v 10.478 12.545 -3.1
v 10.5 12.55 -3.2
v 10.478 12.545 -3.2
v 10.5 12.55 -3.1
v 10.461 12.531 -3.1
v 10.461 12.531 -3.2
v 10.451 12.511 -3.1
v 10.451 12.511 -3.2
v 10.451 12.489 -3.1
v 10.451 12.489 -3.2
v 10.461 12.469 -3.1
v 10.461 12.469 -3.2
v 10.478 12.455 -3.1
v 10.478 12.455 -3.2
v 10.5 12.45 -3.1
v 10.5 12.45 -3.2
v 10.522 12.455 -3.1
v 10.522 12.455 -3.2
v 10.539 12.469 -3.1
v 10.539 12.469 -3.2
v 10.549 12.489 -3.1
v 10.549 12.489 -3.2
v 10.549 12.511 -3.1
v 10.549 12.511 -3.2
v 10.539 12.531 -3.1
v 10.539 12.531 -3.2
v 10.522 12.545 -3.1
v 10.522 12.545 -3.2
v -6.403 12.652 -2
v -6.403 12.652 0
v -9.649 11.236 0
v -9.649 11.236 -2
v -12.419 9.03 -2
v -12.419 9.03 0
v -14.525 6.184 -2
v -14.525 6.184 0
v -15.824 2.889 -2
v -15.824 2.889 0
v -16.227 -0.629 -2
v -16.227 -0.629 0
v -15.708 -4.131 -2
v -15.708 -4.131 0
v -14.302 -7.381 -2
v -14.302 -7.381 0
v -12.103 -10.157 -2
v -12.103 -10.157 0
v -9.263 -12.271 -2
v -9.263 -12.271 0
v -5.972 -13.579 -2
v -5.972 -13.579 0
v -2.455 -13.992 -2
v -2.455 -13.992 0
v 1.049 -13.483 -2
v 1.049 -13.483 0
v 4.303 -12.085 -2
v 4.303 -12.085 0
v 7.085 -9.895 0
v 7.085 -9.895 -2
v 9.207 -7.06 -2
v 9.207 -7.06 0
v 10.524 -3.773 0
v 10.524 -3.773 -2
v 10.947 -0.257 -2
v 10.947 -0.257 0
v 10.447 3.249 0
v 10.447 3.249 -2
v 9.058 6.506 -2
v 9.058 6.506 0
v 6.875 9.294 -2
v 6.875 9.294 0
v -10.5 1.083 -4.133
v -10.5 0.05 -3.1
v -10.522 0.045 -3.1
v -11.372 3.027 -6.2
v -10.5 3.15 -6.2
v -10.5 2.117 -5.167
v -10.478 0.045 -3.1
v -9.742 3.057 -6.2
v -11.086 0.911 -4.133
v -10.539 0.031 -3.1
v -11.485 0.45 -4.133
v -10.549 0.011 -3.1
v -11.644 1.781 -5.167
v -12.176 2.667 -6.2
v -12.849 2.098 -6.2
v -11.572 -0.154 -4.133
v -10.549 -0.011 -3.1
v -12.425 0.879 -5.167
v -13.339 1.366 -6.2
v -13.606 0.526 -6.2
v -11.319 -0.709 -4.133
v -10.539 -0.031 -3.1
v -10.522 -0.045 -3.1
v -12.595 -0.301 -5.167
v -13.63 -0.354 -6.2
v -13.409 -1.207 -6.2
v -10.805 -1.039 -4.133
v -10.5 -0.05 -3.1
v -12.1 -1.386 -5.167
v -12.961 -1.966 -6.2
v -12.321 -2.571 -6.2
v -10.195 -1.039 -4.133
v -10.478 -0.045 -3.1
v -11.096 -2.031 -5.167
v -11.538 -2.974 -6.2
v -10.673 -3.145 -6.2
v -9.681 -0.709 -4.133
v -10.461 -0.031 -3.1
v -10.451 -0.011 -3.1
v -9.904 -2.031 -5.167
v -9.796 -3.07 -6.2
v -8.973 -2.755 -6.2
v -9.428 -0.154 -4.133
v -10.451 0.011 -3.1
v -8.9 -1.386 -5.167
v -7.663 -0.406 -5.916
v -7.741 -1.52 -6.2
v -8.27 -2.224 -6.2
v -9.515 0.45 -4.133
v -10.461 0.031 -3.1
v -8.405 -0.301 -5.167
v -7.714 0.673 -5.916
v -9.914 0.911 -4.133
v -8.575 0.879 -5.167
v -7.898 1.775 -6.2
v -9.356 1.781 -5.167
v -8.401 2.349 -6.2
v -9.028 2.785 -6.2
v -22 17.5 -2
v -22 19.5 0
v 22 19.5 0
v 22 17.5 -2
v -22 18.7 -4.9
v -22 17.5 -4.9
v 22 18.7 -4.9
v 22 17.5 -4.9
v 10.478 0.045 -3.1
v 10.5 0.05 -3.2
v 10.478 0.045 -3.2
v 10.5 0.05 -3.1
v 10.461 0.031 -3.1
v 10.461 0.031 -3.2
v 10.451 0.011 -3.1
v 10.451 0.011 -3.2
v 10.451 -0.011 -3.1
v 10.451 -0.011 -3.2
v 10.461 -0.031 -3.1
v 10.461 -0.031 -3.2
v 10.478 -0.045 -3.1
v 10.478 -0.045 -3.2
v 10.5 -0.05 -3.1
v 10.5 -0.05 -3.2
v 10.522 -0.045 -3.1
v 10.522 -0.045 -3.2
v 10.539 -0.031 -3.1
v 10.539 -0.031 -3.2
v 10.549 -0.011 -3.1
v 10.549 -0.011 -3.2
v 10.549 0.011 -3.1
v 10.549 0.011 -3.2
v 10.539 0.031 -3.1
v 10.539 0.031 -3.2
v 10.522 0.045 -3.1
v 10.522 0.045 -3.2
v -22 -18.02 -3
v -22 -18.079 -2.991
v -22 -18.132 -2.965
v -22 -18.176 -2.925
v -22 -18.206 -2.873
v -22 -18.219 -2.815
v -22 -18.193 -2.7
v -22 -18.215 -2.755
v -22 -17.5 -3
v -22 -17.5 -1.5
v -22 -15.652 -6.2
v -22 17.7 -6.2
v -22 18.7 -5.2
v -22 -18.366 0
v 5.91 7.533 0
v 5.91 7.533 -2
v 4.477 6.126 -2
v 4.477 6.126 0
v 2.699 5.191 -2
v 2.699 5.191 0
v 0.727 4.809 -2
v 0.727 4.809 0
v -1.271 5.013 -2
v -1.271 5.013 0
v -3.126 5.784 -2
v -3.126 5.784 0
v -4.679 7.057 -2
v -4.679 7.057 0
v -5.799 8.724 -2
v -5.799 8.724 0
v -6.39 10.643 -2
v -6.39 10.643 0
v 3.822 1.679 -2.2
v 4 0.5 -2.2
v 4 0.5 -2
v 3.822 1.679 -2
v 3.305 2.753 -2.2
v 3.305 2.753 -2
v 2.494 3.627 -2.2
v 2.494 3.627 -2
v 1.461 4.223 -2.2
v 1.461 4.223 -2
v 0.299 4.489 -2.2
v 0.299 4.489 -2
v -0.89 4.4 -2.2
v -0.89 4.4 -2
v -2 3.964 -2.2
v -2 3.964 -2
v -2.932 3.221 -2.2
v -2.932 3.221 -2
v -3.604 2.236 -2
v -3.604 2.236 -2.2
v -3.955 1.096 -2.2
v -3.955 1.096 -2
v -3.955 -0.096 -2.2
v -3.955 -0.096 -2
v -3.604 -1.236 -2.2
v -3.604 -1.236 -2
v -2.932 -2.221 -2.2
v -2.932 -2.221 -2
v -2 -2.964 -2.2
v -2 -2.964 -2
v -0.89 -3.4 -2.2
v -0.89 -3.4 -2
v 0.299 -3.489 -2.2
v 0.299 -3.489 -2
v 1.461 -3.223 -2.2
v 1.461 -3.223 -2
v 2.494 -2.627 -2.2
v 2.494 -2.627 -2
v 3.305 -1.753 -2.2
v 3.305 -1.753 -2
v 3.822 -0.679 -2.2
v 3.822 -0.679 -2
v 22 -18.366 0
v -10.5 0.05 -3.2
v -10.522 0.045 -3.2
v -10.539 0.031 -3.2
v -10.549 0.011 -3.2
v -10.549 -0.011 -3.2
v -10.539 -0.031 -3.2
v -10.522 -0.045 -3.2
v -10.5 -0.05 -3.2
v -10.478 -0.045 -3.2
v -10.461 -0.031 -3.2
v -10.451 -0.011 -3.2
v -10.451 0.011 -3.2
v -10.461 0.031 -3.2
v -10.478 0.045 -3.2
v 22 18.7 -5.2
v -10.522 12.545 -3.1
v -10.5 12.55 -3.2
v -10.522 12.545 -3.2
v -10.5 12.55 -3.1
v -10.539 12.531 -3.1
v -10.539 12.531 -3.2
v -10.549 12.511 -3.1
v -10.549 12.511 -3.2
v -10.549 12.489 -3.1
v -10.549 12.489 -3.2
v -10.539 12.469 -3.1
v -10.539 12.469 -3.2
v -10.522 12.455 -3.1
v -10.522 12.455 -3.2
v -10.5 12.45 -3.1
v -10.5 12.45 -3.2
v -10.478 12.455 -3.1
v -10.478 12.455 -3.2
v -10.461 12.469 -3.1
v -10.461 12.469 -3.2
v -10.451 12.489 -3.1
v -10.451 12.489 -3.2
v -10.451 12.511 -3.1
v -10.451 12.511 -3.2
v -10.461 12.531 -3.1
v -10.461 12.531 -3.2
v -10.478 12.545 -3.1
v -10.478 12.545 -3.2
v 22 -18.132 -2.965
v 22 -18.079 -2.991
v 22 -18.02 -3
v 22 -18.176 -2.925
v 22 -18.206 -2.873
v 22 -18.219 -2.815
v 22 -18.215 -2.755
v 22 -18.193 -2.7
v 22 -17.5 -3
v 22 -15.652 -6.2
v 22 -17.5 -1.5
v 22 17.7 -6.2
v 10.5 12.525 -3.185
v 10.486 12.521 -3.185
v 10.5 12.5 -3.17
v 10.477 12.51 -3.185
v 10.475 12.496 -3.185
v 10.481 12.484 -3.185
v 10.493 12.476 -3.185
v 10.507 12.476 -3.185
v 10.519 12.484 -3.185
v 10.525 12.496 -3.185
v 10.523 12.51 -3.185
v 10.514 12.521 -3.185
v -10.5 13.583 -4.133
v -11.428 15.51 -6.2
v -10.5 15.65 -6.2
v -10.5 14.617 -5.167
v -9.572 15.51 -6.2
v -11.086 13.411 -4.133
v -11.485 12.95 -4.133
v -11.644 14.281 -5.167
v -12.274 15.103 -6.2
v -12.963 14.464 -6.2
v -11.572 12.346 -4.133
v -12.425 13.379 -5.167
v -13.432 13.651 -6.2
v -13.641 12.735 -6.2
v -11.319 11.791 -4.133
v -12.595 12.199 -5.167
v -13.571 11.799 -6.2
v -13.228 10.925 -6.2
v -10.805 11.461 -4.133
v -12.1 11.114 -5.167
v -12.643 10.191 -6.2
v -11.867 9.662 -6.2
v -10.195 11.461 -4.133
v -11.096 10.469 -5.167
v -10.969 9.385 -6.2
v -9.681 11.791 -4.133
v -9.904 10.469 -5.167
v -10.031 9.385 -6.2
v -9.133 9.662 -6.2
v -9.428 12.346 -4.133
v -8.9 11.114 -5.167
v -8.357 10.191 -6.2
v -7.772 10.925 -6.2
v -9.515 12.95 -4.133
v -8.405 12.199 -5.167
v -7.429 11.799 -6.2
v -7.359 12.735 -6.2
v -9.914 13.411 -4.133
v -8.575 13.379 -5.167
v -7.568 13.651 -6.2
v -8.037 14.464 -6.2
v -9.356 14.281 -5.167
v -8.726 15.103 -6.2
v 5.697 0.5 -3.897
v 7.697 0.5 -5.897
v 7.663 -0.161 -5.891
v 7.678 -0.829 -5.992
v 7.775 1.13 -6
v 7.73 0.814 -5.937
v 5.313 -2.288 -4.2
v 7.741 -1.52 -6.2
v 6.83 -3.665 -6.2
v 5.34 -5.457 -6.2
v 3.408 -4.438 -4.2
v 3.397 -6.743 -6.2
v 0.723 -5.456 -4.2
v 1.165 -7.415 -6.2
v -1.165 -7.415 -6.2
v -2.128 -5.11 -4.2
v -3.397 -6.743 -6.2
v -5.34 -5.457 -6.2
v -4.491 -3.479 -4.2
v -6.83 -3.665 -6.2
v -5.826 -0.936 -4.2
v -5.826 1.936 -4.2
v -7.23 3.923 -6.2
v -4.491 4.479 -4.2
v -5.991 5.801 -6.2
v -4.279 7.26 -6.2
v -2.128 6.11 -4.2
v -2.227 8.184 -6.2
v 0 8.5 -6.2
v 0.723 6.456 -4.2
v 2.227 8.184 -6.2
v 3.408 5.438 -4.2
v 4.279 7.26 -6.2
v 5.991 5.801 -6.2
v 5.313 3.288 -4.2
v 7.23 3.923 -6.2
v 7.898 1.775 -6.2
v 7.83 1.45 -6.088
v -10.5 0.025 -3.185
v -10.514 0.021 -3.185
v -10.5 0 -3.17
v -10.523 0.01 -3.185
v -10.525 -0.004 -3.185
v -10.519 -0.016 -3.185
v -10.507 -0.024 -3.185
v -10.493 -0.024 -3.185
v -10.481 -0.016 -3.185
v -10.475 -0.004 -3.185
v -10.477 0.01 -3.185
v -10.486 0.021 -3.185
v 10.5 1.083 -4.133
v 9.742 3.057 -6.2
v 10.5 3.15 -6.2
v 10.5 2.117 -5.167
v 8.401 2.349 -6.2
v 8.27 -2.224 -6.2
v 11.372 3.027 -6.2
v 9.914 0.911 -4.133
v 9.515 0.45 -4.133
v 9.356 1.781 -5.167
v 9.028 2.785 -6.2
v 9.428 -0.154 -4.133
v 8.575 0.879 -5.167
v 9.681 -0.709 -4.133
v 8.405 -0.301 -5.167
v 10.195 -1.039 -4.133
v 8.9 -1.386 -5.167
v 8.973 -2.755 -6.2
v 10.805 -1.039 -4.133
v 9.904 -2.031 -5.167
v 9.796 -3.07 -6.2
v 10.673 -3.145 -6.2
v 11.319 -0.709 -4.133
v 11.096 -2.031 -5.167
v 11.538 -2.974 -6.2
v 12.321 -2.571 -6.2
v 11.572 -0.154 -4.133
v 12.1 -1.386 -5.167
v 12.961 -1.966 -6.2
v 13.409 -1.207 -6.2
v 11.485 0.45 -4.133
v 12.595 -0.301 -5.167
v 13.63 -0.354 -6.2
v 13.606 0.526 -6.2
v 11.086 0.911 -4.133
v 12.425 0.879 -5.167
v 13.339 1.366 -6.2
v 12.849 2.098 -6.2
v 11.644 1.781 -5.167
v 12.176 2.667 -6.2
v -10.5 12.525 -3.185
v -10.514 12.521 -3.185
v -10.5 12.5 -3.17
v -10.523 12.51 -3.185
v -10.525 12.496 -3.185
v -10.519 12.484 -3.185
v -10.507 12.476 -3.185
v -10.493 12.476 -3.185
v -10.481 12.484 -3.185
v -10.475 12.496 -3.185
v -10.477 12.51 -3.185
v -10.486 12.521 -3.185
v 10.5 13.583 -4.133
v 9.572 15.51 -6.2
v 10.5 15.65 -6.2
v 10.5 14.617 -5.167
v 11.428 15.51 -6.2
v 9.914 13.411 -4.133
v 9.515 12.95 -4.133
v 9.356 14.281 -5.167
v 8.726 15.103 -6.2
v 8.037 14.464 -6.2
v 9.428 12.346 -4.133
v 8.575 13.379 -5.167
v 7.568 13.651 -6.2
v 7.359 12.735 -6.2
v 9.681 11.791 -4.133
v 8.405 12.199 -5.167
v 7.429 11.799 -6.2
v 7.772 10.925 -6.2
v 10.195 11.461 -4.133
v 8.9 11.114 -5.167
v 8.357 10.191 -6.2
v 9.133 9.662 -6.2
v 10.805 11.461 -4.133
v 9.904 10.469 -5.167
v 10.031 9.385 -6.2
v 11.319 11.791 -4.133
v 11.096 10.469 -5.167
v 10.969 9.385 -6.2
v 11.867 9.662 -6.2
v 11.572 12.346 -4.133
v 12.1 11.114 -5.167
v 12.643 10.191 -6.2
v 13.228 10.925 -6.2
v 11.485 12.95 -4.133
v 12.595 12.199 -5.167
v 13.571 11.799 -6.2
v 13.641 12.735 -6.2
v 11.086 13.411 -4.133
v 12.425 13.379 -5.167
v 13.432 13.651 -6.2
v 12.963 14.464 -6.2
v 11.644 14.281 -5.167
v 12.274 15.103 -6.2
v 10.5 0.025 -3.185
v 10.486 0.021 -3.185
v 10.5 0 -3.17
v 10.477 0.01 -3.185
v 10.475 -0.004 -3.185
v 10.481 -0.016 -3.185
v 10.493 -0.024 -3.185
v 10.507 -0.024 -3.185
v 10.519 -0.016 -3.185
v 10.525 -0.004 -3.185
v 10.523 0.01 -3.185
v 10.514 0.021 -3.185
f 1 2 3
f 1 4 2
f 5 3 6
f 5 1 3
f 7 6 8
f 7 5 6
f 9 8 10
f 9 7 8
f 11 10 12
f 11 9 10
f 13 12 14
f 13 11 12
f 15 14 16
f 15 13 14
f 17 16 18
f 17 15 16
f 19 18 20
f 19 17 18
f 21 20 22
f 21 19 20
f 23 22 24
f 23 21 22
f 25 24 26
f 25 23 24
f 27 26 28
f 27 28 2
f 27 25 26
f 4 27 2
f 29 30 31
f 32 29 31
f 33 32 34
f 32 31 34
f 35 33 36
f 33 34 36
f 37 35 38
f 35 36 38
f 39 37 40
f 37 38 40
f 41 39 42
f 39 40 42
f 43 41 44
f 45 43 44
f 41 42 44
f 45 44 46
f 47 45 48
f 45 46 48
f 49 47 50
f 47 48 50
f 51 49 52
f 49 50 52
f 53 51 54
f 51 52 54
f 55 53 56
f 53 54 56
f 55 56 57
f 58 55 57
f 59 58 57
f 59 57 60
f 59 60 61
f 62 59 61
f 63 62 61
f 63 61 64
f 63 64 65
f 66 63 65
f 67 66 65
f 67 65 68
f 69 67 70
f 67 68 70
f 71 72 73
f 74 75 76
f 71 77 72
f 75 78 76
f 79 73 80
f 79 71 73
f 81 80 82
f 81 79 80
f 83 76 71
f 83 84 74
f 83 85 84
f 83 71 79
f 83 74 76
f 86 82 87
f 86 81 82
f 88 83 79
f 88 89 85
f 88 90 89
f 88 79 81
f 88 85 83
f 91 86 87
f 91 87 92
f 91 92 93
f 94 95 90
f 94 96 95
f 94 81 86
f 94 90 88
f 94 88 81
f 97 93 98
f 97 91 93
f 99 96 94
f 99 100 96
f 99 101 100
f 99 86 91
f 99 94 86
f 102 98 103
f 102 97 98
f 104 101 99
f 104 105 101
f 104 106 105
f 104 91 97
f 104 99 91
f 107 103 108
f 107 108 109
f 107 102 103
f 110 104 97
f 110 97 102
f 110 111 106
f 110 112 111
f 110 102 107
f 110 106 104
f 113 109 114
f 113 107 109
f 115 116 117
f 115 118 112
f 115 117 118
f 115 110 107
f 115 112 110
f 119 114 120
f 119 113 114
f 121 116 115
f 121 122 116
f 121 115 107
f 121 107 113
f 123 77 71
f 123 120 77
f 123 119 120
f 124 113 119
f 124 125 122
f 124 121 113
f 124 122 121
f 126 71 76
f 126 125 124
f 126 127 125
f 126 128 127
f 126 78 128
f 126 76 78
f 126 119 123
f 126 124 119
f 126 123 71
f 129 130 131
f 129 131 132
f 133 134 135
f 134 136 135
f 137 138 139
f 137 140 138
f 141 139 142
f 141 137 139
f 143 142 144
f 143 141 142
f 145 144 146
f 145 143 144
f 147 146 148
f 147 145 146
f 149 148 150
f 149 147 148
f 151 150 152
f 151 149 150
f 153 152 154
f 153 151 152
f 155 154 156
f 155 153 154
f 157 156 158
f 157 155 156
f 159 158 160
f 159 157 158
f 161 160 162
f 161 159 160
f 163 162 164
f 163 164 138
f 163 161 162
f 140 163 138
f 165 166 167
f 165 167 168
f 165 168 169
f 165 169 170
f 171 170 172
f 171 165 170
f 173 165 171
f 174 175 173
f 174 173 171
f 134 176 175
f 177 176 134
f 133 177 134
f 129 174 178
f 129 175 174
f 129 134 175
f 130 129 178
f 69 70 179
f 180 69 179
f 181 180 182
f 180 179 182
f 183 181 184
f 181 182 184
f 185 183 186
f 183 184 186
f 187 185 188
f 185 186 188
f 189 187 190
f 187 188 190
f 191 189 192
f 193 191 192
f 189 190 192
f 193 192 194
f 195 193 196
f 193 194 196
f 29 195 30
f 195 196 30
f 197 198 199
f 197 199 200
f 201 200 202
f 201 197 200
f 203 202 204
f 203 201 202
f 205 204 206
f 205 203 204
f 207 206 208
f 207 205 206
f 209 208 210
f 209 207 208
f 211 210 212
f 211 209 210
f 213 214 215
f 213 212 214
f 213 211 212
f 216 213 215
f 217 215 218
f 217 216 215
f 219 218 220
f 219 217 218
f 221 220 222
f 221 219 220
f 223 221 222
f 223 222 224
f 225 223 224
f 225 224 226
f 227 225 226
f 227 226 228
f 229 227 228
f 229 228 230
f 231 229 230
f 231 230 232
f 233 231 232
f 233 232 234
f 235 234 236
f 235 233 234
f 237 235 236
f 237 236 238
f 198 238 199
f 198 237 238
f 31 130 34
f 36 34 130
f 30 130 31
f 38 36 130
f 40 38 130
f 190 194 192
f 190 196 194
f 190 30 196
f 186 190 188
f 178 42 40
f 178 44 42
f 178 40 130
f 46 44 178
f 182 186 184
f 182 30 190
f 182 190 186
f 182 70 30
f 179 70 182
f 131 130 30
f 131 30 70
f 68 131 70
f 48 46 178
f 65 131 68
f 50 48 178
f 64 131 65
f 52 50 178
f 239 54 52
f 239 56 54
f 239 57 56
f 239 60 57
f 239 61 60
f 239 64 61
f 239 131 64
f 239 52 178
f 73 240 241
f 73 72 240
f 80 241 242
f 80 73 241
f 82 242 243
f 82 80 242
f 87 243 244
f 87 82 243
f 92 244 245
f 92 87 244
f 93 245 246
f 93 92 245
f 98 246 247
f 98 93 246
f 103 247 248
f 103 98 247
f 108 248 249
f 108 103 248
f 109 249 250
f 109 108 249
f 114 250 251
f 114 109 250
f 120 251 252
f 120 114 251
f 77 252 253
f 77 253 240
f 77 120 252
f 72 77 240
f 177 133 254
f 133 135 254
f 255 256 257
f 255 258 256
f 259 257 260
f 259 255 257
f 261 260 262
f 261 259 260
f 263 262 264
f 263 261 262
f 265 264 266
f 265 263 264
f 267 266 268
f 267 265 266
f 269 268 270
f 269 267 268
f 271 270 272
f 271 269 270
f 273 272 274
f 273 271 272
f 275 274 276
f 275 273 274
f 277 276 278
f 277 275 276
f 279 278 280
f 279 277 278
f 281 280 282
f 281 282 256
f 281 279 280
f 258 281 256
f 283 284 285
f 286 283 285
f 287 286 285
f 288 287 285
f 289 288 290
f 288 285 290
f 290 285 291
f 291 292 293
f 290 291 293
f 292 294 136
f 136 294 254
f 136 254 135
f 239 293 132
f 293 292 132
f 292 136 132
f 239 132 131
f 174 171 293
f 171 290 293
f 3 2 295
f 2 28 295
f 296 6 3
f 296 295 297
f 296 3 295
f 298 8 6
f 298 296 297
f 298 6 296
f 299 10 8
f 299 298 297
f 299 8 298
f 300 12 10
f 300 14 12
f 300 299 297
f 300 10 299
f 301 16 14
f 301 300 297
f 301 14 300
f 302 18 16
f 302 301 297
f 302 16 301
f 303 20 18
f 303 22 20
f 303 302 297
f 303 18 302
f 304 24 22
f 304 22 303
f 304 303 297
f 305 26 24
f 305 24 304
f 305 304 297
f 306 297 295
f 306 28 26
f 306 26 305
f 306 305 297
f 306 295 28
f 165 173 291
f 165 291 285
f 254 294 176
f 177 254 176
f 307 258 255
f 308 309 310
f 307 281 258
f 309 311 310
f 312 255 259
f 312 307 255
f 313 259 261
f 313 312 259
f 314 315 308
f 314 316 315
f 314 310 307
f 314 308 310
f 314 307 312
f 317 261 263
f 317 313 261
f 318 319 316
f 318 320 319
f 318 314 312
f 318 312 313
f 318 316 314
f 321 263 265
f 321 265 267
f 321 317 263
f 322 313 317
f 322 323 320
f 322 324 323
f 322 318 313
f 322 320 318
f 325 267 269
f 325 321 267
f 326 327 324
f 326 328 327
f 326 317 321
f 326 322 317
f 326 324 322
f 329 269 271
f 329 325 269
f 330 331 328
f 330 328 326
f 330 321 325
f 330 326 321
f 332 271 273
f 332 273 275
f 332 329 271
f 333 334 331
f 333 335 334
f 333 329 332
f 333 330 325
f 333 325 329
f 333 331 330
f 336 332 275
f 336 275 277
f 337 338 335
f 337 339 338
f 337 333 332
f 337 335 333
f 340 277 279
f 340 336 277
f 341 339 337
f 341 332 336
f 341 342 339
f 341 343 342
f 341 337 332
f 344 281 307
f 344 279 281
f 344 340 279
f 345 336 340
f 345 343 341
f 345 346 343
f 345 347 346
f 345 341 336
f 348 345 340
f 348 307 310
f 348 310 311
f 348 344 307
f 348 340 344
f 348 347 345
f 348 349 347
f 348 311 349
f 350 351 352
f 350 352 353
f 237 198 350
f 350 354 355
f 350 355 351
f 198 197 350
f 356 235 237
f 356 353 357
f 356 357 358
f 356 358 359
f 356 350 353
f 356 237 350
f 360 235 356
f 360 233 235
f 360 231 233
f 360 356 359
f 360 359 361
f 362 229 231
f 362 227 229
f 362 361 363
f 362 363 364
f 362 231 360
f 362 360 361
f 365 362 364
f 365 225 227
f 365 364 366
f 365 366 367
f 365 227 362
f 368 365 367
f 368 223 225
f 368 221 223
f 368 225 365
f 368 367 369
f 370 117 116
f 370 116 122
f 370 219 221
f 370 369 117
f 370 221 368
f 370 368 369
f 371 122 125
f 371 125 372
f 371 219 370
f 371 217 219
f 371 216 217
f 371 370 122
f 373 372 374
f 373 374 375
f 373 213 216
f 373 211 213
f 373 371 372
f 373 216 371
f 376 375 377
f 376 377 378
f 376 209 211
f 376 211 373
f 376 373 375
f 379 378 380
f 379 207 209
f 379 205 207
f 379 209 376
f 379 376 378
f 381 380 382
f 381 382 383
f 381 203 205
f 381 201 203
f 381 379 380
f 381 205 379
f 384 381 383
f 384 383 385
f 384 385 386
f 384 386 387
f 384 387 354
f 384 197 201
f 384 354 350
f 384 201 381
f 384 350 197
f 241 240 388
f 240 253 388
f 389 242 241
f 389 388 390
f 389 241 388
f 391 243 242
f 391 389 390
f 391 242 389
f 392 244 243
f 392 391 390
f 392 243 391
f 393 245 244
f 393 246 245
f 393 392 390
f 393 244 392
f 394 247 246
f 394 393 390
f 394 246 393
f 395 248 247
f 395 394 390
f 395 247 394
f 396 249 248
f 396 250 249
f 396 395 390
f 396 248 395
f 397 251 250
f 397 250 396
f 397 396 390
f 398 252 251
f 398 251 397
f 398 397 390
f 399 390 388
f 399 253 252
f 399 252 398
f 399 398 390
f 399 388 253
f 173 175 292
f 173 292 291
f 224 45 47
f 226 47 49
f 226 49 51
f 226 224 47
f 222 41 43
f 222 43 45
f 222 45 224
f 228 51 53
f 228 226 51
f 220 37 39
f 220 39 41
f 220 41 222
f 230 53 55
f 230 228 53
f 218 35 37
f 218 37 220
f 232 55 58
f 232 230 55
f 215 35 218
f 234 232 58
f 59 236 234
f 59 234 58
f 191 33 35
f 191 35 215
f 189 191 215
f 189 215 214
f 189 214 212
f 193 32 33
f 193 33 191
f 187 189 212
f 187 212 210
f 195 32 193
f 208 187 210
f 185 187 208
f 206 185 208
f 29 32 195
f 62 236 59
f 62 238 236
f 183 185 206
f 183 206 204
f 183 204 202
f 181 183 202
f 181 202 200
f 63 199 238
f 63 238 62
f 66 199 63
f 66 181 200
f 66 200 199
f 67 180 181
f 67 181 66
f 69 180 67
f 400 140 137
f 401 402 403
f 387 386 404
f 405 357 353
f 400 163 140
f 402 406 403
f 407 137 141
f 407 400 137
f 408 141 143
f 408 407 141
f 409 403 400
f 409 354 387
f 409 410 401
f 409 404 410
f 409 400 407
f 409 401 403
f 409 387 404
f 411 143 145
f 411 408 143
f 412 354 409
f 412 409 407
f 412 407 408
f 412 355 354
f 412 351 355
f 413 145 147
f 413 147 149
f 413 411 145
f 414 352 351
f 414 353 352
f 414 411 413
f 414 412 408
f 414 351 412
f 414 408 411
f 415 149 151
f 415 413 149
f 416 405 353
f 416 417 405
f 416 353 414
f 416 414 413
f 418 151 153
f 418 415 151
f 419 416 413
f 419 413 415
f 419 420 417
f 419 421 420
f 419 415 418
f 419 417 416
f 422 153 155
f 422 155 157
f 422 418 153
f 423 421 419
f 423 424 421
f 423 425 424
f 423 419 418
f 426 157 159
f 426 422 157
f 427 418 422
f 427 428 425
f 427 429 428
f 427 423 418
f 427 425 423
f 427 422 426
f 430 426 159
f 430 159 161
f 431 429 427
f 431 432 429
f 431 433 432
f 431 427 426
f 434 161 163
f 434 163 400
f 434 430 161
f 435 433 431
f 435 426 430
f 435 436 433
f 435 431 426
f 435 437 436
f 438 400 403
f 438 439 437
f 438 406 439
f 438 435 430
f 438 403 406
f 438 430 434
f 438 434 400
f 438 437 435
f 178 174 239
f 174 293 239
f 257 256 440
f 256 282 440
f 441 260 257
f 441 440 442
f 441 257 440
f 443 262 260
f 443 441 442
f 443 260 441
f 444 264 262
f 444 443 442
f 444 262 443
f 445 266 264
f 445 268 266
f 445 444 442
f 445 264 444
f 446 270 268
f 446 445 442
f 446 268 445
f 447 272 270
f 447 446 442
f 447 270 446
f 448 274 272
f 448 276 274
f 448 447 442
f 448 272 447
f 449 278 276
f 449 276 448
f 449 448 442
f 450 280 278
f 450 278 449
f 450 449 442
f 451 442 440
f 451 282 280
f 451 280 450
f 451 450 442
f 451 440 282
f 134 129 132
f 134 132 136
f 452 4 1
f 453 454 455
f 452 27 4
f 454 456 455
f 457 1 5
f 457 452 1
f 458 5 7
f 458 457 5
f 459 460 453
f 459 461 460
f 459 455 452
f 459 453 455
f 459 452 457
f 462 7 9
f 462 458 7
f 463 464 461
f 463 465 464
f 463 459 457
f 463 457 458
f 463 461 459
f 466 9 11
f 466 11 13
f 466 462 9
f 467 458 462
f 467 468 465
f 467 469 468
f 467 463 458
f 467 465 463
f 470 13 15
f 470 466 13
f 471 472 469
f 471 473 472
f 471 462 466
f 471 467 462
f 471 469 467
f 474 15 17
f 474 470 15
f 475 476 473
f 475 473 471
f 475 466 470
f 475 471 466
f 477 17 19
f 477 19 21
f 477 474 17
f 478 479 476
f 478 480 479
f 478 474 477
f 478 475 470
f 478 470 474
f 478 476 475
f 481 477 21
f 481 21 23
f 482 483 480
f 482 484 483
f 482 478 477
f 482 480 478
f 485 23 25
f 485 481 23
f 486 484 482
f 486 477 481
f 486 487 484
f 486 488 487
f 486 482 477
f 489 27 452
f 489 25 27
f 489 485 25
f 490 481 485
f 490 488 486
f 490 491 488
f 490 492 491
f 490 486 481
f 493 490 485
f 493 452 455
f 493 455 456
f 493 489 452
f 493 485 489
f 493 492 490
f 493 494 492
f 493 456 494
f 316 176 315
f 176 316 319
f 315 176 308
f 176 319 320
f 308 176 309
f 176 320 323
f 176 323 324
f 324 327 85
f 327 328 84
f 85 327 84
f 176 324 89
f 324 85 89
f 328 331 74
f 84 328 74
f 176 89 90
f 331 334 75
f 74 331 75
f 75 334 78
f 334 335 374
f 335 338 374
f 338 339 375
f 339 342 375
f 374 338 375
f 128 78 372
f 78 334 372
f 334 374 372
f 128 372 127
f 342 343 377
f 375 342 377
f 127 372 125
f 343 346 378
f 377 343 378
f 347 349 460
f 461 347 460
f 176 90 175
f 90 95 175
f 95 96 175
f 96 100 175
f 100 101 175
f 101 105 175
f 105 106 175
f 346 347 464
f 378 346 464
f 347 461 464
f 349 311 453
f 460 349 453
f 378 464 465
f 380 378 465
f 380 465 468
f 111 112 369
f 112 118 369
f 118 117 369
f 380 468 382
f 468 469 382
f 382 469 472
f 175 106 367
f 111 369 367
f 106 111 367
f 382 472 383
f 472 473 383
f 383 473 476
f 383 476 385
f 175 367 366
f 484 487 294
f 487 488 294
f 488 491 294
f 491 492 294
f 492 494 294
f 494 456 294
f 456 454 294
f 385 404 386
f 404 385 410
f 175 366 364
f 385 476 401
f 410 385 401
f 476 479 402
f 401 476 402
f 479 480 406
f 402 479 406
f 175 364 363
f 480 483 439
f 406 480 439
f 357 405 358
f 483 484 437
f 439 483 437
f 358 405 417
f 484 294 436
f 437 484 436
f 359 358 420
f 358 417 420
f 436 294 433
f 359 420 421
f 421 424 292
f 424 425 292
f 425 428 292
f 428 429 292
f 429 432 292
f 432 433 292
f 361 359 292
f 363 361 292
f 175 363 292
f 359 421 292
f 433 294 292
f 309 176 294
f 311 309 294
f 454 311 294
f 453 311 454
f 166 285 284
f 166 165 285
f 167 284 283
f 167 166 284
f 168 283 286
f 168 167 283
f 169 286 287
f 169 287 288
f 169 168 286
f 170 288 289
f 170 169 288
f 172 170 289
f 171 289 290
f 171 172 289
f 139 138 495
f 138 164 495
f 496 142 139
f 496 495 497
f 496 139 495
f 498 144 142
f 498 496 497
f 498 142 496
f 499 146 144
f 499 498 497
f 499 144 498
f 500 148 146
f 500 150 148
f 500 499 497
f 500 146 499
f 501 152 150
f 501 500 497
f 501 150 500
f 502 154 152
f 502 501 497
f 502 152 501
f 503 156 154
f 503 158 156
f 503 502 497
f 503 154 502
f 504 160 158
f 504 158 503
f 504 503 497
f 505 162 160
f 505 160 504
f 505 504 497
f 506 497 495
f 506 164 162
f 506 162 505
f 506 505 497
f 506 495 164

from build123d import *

# Parameters (mm, degrees)
BOSS_EXTRUDE1_DEPTH                          = 22
CUT_EXTRUDE1_DEPTH                           = 31.044799883
CUT_EXTRUDE1_DEPTH_BACK                      = 31.044799883
SKETCH4_R                                    = 4
CHAMFER1_SIZE                                = 1
CHAMFER2_SIZE                                = 4
CSK_FOR_M3_COUNTERSUNK_FLAT_HEAD_SCR_2_COUNT = 2
CSK_FOR_M3_COUNTERSUNK_FLAT_HEAD_SCR_2_PITCH = 21
CSK_FOR_M3_COUNTERSUNK_FLAT_HEAD_SCR_3_COUNT = 2
CSK_FOR_M3_COUNTERSUNK_FLAT_HEAD_SCR_3_PITCH = 24.43869882
CSK_FOR_M3_COUNTERSUNK_FLAT_HEAD_SCR_4_COUNT = 2
CSK_FOR_M3_COUNTERSUNK_FLAT_HEAD_SCR_4_PITCH = 12.5
FILLET1_R                                    = 0.2
CUT_EXTRUDE2_DEPTH                           = 2


with BuildPart() as part:
    # Sketch2 → Boss-Extrude1 (new, symmetric)
    with BuildSketch(Plane(origin=(0, 0, 0), x_dir=(0, 0, -1), z_dir=(1, 0, 0))):
        Polygon((2, 17.5), (4.9, 17.5), (4.9, 18.7), (6.2, 18.7), (6.2, -15.652479139), (3, -17.5), (3, -18.366025404), (1.5, -17.5), (0, -18.366025404), (0, -17.5), (0, 17.5), (0, 19.5), align=None)
    extrude(amount=BOSS_EXTRUDE1_DEPTH, both=True)

    # Sketch4 → Cut-Extrude1 (cut, two sides: drawn at the far end of the back side and taken through both)
    with BuildSketch(Plane.XY.offset(-CUT_EXTRUDE1_DEPTH_BACK)):
        with Locations((0, 0.5)):
            Circle(SKETCH4_R)
    extrude(amount=CUT_EXTRUDE1_DEPTH + CUT_EXTRUDE1_DEPTH_BACK, mode=Mode.SUBTRACT)

    # Chamfer1
    chamfer1_edges = [part.edges().sort_by_distance(p)[0] for p in [
        (0, 18.7, -6.2),
    ]]
    chamfer(chamfer1_edges, length=CHAMFER1_SIZE)

    # Chamfer2
    chamfer2_edges = [part.edges().sort_by_distance(p)[0] for p in [
        (-4, 0.5, -6.2),
    ]]
    chamfer(chamfer2_edges, length=CHAMFER2_SIZE)

    # Sketch7 → CSK for M3 Countersunk Flat Head Screw1 (revolve, cut)
    with BuildSketch(Plane(origin=(10.5, 12.5, -6.2), x_dir=(0, 1, 0), z_dir=(1, 0, 0))):
        Polygon((0, 0), (0, 3.030043031), (0.05, 3), (0.05, 3.1), (3.15, 0), align=None)
    csk_for_m3_countersunk_flat_head_screw1 = revolve(axis=Axis((10.5, 12.5, -12.55), (0, 0, 1)), mode=Mode.SUBTRACT)

    # CSK for M3 Countersunk Flat Head Scr 2: CSK for M3 Countersunk Flat Head Screw1 ×2
    with Locations(*[(-i * CSK_FOR_M3_COUNTERSUNK_FLAT_HEAD_SCR_2_PITCH, 0, 0) for i in range(1, CSK_FOR_M3_COUNTERSUNK_FLAT_HEAD_SCR_2_COUNT)]):
        add(csk_for_m3_countersunk_flat_head_screw1, mode=Mode.SUBTRACT)

    # CSK for M3 Countersunk Flat Head Scr 3: CSK for M3 Countersunk Flat Head Screw1 ×2
    with Locations(*[Vector(-0.8592928844097067, -0.5114838597676826, 0) * (i * CSK_FOR_M3_COUNTERSUNK_FLAT_HEAD_SCR_3_PITCH) for i in range(1, CSK_FOR_M3_COUNTERSUNK_FLAT_HEAD_SCR_3_COUNT)]):
        add(csk_for_m3_countersunk_flat_head_screw1, mode=Mode.SUBTRACT)

    # CSK for M3 Countersunk Flat Head Scr 4: CSK for M3 Countersunk Flat Head Screw1 ×2
    with Locations(*[(0, -i * CSK_FOR_M3_COUNTERSUNK_FLAT_HEAD_SCR_4_PITCH, 0) for i in range(1, CSK_FOR_M3_COUNTERSUNK_FLAT_HEAD_SCR_4_COUNT)]):
        add(csk_for_m3_countersunk_flat_head_screw1, mode=Mode.SUBTRACT)

    # Fillet1
    fillet1_edges = [part.edges().sort_by_distance(p)[0] for p in [
        (0, -18.366025404, -3),
    ]]
    fillet(fillet1_edges, radius=FILLET1_R)

    # Sketch3 → Cut-Extrude2 (cut)
    with BuildSketch(Plane.XY):
        with BuildLine():
            ThreePointArc((6.875473952, 9.29422206), (-1.27095435, 5.012578964), (-6.403163839, 12.651766581))
            ThreePointArc((-6.403163839, 12.651766581), (-5.971888857, -13.578985861), (6.875473952, 9.29422206))
        make_face()
    extrude(amount=-CUT_EXTRUDE2_DEPTH, mode=Mode.SUBTRACT)


solid = part.part
